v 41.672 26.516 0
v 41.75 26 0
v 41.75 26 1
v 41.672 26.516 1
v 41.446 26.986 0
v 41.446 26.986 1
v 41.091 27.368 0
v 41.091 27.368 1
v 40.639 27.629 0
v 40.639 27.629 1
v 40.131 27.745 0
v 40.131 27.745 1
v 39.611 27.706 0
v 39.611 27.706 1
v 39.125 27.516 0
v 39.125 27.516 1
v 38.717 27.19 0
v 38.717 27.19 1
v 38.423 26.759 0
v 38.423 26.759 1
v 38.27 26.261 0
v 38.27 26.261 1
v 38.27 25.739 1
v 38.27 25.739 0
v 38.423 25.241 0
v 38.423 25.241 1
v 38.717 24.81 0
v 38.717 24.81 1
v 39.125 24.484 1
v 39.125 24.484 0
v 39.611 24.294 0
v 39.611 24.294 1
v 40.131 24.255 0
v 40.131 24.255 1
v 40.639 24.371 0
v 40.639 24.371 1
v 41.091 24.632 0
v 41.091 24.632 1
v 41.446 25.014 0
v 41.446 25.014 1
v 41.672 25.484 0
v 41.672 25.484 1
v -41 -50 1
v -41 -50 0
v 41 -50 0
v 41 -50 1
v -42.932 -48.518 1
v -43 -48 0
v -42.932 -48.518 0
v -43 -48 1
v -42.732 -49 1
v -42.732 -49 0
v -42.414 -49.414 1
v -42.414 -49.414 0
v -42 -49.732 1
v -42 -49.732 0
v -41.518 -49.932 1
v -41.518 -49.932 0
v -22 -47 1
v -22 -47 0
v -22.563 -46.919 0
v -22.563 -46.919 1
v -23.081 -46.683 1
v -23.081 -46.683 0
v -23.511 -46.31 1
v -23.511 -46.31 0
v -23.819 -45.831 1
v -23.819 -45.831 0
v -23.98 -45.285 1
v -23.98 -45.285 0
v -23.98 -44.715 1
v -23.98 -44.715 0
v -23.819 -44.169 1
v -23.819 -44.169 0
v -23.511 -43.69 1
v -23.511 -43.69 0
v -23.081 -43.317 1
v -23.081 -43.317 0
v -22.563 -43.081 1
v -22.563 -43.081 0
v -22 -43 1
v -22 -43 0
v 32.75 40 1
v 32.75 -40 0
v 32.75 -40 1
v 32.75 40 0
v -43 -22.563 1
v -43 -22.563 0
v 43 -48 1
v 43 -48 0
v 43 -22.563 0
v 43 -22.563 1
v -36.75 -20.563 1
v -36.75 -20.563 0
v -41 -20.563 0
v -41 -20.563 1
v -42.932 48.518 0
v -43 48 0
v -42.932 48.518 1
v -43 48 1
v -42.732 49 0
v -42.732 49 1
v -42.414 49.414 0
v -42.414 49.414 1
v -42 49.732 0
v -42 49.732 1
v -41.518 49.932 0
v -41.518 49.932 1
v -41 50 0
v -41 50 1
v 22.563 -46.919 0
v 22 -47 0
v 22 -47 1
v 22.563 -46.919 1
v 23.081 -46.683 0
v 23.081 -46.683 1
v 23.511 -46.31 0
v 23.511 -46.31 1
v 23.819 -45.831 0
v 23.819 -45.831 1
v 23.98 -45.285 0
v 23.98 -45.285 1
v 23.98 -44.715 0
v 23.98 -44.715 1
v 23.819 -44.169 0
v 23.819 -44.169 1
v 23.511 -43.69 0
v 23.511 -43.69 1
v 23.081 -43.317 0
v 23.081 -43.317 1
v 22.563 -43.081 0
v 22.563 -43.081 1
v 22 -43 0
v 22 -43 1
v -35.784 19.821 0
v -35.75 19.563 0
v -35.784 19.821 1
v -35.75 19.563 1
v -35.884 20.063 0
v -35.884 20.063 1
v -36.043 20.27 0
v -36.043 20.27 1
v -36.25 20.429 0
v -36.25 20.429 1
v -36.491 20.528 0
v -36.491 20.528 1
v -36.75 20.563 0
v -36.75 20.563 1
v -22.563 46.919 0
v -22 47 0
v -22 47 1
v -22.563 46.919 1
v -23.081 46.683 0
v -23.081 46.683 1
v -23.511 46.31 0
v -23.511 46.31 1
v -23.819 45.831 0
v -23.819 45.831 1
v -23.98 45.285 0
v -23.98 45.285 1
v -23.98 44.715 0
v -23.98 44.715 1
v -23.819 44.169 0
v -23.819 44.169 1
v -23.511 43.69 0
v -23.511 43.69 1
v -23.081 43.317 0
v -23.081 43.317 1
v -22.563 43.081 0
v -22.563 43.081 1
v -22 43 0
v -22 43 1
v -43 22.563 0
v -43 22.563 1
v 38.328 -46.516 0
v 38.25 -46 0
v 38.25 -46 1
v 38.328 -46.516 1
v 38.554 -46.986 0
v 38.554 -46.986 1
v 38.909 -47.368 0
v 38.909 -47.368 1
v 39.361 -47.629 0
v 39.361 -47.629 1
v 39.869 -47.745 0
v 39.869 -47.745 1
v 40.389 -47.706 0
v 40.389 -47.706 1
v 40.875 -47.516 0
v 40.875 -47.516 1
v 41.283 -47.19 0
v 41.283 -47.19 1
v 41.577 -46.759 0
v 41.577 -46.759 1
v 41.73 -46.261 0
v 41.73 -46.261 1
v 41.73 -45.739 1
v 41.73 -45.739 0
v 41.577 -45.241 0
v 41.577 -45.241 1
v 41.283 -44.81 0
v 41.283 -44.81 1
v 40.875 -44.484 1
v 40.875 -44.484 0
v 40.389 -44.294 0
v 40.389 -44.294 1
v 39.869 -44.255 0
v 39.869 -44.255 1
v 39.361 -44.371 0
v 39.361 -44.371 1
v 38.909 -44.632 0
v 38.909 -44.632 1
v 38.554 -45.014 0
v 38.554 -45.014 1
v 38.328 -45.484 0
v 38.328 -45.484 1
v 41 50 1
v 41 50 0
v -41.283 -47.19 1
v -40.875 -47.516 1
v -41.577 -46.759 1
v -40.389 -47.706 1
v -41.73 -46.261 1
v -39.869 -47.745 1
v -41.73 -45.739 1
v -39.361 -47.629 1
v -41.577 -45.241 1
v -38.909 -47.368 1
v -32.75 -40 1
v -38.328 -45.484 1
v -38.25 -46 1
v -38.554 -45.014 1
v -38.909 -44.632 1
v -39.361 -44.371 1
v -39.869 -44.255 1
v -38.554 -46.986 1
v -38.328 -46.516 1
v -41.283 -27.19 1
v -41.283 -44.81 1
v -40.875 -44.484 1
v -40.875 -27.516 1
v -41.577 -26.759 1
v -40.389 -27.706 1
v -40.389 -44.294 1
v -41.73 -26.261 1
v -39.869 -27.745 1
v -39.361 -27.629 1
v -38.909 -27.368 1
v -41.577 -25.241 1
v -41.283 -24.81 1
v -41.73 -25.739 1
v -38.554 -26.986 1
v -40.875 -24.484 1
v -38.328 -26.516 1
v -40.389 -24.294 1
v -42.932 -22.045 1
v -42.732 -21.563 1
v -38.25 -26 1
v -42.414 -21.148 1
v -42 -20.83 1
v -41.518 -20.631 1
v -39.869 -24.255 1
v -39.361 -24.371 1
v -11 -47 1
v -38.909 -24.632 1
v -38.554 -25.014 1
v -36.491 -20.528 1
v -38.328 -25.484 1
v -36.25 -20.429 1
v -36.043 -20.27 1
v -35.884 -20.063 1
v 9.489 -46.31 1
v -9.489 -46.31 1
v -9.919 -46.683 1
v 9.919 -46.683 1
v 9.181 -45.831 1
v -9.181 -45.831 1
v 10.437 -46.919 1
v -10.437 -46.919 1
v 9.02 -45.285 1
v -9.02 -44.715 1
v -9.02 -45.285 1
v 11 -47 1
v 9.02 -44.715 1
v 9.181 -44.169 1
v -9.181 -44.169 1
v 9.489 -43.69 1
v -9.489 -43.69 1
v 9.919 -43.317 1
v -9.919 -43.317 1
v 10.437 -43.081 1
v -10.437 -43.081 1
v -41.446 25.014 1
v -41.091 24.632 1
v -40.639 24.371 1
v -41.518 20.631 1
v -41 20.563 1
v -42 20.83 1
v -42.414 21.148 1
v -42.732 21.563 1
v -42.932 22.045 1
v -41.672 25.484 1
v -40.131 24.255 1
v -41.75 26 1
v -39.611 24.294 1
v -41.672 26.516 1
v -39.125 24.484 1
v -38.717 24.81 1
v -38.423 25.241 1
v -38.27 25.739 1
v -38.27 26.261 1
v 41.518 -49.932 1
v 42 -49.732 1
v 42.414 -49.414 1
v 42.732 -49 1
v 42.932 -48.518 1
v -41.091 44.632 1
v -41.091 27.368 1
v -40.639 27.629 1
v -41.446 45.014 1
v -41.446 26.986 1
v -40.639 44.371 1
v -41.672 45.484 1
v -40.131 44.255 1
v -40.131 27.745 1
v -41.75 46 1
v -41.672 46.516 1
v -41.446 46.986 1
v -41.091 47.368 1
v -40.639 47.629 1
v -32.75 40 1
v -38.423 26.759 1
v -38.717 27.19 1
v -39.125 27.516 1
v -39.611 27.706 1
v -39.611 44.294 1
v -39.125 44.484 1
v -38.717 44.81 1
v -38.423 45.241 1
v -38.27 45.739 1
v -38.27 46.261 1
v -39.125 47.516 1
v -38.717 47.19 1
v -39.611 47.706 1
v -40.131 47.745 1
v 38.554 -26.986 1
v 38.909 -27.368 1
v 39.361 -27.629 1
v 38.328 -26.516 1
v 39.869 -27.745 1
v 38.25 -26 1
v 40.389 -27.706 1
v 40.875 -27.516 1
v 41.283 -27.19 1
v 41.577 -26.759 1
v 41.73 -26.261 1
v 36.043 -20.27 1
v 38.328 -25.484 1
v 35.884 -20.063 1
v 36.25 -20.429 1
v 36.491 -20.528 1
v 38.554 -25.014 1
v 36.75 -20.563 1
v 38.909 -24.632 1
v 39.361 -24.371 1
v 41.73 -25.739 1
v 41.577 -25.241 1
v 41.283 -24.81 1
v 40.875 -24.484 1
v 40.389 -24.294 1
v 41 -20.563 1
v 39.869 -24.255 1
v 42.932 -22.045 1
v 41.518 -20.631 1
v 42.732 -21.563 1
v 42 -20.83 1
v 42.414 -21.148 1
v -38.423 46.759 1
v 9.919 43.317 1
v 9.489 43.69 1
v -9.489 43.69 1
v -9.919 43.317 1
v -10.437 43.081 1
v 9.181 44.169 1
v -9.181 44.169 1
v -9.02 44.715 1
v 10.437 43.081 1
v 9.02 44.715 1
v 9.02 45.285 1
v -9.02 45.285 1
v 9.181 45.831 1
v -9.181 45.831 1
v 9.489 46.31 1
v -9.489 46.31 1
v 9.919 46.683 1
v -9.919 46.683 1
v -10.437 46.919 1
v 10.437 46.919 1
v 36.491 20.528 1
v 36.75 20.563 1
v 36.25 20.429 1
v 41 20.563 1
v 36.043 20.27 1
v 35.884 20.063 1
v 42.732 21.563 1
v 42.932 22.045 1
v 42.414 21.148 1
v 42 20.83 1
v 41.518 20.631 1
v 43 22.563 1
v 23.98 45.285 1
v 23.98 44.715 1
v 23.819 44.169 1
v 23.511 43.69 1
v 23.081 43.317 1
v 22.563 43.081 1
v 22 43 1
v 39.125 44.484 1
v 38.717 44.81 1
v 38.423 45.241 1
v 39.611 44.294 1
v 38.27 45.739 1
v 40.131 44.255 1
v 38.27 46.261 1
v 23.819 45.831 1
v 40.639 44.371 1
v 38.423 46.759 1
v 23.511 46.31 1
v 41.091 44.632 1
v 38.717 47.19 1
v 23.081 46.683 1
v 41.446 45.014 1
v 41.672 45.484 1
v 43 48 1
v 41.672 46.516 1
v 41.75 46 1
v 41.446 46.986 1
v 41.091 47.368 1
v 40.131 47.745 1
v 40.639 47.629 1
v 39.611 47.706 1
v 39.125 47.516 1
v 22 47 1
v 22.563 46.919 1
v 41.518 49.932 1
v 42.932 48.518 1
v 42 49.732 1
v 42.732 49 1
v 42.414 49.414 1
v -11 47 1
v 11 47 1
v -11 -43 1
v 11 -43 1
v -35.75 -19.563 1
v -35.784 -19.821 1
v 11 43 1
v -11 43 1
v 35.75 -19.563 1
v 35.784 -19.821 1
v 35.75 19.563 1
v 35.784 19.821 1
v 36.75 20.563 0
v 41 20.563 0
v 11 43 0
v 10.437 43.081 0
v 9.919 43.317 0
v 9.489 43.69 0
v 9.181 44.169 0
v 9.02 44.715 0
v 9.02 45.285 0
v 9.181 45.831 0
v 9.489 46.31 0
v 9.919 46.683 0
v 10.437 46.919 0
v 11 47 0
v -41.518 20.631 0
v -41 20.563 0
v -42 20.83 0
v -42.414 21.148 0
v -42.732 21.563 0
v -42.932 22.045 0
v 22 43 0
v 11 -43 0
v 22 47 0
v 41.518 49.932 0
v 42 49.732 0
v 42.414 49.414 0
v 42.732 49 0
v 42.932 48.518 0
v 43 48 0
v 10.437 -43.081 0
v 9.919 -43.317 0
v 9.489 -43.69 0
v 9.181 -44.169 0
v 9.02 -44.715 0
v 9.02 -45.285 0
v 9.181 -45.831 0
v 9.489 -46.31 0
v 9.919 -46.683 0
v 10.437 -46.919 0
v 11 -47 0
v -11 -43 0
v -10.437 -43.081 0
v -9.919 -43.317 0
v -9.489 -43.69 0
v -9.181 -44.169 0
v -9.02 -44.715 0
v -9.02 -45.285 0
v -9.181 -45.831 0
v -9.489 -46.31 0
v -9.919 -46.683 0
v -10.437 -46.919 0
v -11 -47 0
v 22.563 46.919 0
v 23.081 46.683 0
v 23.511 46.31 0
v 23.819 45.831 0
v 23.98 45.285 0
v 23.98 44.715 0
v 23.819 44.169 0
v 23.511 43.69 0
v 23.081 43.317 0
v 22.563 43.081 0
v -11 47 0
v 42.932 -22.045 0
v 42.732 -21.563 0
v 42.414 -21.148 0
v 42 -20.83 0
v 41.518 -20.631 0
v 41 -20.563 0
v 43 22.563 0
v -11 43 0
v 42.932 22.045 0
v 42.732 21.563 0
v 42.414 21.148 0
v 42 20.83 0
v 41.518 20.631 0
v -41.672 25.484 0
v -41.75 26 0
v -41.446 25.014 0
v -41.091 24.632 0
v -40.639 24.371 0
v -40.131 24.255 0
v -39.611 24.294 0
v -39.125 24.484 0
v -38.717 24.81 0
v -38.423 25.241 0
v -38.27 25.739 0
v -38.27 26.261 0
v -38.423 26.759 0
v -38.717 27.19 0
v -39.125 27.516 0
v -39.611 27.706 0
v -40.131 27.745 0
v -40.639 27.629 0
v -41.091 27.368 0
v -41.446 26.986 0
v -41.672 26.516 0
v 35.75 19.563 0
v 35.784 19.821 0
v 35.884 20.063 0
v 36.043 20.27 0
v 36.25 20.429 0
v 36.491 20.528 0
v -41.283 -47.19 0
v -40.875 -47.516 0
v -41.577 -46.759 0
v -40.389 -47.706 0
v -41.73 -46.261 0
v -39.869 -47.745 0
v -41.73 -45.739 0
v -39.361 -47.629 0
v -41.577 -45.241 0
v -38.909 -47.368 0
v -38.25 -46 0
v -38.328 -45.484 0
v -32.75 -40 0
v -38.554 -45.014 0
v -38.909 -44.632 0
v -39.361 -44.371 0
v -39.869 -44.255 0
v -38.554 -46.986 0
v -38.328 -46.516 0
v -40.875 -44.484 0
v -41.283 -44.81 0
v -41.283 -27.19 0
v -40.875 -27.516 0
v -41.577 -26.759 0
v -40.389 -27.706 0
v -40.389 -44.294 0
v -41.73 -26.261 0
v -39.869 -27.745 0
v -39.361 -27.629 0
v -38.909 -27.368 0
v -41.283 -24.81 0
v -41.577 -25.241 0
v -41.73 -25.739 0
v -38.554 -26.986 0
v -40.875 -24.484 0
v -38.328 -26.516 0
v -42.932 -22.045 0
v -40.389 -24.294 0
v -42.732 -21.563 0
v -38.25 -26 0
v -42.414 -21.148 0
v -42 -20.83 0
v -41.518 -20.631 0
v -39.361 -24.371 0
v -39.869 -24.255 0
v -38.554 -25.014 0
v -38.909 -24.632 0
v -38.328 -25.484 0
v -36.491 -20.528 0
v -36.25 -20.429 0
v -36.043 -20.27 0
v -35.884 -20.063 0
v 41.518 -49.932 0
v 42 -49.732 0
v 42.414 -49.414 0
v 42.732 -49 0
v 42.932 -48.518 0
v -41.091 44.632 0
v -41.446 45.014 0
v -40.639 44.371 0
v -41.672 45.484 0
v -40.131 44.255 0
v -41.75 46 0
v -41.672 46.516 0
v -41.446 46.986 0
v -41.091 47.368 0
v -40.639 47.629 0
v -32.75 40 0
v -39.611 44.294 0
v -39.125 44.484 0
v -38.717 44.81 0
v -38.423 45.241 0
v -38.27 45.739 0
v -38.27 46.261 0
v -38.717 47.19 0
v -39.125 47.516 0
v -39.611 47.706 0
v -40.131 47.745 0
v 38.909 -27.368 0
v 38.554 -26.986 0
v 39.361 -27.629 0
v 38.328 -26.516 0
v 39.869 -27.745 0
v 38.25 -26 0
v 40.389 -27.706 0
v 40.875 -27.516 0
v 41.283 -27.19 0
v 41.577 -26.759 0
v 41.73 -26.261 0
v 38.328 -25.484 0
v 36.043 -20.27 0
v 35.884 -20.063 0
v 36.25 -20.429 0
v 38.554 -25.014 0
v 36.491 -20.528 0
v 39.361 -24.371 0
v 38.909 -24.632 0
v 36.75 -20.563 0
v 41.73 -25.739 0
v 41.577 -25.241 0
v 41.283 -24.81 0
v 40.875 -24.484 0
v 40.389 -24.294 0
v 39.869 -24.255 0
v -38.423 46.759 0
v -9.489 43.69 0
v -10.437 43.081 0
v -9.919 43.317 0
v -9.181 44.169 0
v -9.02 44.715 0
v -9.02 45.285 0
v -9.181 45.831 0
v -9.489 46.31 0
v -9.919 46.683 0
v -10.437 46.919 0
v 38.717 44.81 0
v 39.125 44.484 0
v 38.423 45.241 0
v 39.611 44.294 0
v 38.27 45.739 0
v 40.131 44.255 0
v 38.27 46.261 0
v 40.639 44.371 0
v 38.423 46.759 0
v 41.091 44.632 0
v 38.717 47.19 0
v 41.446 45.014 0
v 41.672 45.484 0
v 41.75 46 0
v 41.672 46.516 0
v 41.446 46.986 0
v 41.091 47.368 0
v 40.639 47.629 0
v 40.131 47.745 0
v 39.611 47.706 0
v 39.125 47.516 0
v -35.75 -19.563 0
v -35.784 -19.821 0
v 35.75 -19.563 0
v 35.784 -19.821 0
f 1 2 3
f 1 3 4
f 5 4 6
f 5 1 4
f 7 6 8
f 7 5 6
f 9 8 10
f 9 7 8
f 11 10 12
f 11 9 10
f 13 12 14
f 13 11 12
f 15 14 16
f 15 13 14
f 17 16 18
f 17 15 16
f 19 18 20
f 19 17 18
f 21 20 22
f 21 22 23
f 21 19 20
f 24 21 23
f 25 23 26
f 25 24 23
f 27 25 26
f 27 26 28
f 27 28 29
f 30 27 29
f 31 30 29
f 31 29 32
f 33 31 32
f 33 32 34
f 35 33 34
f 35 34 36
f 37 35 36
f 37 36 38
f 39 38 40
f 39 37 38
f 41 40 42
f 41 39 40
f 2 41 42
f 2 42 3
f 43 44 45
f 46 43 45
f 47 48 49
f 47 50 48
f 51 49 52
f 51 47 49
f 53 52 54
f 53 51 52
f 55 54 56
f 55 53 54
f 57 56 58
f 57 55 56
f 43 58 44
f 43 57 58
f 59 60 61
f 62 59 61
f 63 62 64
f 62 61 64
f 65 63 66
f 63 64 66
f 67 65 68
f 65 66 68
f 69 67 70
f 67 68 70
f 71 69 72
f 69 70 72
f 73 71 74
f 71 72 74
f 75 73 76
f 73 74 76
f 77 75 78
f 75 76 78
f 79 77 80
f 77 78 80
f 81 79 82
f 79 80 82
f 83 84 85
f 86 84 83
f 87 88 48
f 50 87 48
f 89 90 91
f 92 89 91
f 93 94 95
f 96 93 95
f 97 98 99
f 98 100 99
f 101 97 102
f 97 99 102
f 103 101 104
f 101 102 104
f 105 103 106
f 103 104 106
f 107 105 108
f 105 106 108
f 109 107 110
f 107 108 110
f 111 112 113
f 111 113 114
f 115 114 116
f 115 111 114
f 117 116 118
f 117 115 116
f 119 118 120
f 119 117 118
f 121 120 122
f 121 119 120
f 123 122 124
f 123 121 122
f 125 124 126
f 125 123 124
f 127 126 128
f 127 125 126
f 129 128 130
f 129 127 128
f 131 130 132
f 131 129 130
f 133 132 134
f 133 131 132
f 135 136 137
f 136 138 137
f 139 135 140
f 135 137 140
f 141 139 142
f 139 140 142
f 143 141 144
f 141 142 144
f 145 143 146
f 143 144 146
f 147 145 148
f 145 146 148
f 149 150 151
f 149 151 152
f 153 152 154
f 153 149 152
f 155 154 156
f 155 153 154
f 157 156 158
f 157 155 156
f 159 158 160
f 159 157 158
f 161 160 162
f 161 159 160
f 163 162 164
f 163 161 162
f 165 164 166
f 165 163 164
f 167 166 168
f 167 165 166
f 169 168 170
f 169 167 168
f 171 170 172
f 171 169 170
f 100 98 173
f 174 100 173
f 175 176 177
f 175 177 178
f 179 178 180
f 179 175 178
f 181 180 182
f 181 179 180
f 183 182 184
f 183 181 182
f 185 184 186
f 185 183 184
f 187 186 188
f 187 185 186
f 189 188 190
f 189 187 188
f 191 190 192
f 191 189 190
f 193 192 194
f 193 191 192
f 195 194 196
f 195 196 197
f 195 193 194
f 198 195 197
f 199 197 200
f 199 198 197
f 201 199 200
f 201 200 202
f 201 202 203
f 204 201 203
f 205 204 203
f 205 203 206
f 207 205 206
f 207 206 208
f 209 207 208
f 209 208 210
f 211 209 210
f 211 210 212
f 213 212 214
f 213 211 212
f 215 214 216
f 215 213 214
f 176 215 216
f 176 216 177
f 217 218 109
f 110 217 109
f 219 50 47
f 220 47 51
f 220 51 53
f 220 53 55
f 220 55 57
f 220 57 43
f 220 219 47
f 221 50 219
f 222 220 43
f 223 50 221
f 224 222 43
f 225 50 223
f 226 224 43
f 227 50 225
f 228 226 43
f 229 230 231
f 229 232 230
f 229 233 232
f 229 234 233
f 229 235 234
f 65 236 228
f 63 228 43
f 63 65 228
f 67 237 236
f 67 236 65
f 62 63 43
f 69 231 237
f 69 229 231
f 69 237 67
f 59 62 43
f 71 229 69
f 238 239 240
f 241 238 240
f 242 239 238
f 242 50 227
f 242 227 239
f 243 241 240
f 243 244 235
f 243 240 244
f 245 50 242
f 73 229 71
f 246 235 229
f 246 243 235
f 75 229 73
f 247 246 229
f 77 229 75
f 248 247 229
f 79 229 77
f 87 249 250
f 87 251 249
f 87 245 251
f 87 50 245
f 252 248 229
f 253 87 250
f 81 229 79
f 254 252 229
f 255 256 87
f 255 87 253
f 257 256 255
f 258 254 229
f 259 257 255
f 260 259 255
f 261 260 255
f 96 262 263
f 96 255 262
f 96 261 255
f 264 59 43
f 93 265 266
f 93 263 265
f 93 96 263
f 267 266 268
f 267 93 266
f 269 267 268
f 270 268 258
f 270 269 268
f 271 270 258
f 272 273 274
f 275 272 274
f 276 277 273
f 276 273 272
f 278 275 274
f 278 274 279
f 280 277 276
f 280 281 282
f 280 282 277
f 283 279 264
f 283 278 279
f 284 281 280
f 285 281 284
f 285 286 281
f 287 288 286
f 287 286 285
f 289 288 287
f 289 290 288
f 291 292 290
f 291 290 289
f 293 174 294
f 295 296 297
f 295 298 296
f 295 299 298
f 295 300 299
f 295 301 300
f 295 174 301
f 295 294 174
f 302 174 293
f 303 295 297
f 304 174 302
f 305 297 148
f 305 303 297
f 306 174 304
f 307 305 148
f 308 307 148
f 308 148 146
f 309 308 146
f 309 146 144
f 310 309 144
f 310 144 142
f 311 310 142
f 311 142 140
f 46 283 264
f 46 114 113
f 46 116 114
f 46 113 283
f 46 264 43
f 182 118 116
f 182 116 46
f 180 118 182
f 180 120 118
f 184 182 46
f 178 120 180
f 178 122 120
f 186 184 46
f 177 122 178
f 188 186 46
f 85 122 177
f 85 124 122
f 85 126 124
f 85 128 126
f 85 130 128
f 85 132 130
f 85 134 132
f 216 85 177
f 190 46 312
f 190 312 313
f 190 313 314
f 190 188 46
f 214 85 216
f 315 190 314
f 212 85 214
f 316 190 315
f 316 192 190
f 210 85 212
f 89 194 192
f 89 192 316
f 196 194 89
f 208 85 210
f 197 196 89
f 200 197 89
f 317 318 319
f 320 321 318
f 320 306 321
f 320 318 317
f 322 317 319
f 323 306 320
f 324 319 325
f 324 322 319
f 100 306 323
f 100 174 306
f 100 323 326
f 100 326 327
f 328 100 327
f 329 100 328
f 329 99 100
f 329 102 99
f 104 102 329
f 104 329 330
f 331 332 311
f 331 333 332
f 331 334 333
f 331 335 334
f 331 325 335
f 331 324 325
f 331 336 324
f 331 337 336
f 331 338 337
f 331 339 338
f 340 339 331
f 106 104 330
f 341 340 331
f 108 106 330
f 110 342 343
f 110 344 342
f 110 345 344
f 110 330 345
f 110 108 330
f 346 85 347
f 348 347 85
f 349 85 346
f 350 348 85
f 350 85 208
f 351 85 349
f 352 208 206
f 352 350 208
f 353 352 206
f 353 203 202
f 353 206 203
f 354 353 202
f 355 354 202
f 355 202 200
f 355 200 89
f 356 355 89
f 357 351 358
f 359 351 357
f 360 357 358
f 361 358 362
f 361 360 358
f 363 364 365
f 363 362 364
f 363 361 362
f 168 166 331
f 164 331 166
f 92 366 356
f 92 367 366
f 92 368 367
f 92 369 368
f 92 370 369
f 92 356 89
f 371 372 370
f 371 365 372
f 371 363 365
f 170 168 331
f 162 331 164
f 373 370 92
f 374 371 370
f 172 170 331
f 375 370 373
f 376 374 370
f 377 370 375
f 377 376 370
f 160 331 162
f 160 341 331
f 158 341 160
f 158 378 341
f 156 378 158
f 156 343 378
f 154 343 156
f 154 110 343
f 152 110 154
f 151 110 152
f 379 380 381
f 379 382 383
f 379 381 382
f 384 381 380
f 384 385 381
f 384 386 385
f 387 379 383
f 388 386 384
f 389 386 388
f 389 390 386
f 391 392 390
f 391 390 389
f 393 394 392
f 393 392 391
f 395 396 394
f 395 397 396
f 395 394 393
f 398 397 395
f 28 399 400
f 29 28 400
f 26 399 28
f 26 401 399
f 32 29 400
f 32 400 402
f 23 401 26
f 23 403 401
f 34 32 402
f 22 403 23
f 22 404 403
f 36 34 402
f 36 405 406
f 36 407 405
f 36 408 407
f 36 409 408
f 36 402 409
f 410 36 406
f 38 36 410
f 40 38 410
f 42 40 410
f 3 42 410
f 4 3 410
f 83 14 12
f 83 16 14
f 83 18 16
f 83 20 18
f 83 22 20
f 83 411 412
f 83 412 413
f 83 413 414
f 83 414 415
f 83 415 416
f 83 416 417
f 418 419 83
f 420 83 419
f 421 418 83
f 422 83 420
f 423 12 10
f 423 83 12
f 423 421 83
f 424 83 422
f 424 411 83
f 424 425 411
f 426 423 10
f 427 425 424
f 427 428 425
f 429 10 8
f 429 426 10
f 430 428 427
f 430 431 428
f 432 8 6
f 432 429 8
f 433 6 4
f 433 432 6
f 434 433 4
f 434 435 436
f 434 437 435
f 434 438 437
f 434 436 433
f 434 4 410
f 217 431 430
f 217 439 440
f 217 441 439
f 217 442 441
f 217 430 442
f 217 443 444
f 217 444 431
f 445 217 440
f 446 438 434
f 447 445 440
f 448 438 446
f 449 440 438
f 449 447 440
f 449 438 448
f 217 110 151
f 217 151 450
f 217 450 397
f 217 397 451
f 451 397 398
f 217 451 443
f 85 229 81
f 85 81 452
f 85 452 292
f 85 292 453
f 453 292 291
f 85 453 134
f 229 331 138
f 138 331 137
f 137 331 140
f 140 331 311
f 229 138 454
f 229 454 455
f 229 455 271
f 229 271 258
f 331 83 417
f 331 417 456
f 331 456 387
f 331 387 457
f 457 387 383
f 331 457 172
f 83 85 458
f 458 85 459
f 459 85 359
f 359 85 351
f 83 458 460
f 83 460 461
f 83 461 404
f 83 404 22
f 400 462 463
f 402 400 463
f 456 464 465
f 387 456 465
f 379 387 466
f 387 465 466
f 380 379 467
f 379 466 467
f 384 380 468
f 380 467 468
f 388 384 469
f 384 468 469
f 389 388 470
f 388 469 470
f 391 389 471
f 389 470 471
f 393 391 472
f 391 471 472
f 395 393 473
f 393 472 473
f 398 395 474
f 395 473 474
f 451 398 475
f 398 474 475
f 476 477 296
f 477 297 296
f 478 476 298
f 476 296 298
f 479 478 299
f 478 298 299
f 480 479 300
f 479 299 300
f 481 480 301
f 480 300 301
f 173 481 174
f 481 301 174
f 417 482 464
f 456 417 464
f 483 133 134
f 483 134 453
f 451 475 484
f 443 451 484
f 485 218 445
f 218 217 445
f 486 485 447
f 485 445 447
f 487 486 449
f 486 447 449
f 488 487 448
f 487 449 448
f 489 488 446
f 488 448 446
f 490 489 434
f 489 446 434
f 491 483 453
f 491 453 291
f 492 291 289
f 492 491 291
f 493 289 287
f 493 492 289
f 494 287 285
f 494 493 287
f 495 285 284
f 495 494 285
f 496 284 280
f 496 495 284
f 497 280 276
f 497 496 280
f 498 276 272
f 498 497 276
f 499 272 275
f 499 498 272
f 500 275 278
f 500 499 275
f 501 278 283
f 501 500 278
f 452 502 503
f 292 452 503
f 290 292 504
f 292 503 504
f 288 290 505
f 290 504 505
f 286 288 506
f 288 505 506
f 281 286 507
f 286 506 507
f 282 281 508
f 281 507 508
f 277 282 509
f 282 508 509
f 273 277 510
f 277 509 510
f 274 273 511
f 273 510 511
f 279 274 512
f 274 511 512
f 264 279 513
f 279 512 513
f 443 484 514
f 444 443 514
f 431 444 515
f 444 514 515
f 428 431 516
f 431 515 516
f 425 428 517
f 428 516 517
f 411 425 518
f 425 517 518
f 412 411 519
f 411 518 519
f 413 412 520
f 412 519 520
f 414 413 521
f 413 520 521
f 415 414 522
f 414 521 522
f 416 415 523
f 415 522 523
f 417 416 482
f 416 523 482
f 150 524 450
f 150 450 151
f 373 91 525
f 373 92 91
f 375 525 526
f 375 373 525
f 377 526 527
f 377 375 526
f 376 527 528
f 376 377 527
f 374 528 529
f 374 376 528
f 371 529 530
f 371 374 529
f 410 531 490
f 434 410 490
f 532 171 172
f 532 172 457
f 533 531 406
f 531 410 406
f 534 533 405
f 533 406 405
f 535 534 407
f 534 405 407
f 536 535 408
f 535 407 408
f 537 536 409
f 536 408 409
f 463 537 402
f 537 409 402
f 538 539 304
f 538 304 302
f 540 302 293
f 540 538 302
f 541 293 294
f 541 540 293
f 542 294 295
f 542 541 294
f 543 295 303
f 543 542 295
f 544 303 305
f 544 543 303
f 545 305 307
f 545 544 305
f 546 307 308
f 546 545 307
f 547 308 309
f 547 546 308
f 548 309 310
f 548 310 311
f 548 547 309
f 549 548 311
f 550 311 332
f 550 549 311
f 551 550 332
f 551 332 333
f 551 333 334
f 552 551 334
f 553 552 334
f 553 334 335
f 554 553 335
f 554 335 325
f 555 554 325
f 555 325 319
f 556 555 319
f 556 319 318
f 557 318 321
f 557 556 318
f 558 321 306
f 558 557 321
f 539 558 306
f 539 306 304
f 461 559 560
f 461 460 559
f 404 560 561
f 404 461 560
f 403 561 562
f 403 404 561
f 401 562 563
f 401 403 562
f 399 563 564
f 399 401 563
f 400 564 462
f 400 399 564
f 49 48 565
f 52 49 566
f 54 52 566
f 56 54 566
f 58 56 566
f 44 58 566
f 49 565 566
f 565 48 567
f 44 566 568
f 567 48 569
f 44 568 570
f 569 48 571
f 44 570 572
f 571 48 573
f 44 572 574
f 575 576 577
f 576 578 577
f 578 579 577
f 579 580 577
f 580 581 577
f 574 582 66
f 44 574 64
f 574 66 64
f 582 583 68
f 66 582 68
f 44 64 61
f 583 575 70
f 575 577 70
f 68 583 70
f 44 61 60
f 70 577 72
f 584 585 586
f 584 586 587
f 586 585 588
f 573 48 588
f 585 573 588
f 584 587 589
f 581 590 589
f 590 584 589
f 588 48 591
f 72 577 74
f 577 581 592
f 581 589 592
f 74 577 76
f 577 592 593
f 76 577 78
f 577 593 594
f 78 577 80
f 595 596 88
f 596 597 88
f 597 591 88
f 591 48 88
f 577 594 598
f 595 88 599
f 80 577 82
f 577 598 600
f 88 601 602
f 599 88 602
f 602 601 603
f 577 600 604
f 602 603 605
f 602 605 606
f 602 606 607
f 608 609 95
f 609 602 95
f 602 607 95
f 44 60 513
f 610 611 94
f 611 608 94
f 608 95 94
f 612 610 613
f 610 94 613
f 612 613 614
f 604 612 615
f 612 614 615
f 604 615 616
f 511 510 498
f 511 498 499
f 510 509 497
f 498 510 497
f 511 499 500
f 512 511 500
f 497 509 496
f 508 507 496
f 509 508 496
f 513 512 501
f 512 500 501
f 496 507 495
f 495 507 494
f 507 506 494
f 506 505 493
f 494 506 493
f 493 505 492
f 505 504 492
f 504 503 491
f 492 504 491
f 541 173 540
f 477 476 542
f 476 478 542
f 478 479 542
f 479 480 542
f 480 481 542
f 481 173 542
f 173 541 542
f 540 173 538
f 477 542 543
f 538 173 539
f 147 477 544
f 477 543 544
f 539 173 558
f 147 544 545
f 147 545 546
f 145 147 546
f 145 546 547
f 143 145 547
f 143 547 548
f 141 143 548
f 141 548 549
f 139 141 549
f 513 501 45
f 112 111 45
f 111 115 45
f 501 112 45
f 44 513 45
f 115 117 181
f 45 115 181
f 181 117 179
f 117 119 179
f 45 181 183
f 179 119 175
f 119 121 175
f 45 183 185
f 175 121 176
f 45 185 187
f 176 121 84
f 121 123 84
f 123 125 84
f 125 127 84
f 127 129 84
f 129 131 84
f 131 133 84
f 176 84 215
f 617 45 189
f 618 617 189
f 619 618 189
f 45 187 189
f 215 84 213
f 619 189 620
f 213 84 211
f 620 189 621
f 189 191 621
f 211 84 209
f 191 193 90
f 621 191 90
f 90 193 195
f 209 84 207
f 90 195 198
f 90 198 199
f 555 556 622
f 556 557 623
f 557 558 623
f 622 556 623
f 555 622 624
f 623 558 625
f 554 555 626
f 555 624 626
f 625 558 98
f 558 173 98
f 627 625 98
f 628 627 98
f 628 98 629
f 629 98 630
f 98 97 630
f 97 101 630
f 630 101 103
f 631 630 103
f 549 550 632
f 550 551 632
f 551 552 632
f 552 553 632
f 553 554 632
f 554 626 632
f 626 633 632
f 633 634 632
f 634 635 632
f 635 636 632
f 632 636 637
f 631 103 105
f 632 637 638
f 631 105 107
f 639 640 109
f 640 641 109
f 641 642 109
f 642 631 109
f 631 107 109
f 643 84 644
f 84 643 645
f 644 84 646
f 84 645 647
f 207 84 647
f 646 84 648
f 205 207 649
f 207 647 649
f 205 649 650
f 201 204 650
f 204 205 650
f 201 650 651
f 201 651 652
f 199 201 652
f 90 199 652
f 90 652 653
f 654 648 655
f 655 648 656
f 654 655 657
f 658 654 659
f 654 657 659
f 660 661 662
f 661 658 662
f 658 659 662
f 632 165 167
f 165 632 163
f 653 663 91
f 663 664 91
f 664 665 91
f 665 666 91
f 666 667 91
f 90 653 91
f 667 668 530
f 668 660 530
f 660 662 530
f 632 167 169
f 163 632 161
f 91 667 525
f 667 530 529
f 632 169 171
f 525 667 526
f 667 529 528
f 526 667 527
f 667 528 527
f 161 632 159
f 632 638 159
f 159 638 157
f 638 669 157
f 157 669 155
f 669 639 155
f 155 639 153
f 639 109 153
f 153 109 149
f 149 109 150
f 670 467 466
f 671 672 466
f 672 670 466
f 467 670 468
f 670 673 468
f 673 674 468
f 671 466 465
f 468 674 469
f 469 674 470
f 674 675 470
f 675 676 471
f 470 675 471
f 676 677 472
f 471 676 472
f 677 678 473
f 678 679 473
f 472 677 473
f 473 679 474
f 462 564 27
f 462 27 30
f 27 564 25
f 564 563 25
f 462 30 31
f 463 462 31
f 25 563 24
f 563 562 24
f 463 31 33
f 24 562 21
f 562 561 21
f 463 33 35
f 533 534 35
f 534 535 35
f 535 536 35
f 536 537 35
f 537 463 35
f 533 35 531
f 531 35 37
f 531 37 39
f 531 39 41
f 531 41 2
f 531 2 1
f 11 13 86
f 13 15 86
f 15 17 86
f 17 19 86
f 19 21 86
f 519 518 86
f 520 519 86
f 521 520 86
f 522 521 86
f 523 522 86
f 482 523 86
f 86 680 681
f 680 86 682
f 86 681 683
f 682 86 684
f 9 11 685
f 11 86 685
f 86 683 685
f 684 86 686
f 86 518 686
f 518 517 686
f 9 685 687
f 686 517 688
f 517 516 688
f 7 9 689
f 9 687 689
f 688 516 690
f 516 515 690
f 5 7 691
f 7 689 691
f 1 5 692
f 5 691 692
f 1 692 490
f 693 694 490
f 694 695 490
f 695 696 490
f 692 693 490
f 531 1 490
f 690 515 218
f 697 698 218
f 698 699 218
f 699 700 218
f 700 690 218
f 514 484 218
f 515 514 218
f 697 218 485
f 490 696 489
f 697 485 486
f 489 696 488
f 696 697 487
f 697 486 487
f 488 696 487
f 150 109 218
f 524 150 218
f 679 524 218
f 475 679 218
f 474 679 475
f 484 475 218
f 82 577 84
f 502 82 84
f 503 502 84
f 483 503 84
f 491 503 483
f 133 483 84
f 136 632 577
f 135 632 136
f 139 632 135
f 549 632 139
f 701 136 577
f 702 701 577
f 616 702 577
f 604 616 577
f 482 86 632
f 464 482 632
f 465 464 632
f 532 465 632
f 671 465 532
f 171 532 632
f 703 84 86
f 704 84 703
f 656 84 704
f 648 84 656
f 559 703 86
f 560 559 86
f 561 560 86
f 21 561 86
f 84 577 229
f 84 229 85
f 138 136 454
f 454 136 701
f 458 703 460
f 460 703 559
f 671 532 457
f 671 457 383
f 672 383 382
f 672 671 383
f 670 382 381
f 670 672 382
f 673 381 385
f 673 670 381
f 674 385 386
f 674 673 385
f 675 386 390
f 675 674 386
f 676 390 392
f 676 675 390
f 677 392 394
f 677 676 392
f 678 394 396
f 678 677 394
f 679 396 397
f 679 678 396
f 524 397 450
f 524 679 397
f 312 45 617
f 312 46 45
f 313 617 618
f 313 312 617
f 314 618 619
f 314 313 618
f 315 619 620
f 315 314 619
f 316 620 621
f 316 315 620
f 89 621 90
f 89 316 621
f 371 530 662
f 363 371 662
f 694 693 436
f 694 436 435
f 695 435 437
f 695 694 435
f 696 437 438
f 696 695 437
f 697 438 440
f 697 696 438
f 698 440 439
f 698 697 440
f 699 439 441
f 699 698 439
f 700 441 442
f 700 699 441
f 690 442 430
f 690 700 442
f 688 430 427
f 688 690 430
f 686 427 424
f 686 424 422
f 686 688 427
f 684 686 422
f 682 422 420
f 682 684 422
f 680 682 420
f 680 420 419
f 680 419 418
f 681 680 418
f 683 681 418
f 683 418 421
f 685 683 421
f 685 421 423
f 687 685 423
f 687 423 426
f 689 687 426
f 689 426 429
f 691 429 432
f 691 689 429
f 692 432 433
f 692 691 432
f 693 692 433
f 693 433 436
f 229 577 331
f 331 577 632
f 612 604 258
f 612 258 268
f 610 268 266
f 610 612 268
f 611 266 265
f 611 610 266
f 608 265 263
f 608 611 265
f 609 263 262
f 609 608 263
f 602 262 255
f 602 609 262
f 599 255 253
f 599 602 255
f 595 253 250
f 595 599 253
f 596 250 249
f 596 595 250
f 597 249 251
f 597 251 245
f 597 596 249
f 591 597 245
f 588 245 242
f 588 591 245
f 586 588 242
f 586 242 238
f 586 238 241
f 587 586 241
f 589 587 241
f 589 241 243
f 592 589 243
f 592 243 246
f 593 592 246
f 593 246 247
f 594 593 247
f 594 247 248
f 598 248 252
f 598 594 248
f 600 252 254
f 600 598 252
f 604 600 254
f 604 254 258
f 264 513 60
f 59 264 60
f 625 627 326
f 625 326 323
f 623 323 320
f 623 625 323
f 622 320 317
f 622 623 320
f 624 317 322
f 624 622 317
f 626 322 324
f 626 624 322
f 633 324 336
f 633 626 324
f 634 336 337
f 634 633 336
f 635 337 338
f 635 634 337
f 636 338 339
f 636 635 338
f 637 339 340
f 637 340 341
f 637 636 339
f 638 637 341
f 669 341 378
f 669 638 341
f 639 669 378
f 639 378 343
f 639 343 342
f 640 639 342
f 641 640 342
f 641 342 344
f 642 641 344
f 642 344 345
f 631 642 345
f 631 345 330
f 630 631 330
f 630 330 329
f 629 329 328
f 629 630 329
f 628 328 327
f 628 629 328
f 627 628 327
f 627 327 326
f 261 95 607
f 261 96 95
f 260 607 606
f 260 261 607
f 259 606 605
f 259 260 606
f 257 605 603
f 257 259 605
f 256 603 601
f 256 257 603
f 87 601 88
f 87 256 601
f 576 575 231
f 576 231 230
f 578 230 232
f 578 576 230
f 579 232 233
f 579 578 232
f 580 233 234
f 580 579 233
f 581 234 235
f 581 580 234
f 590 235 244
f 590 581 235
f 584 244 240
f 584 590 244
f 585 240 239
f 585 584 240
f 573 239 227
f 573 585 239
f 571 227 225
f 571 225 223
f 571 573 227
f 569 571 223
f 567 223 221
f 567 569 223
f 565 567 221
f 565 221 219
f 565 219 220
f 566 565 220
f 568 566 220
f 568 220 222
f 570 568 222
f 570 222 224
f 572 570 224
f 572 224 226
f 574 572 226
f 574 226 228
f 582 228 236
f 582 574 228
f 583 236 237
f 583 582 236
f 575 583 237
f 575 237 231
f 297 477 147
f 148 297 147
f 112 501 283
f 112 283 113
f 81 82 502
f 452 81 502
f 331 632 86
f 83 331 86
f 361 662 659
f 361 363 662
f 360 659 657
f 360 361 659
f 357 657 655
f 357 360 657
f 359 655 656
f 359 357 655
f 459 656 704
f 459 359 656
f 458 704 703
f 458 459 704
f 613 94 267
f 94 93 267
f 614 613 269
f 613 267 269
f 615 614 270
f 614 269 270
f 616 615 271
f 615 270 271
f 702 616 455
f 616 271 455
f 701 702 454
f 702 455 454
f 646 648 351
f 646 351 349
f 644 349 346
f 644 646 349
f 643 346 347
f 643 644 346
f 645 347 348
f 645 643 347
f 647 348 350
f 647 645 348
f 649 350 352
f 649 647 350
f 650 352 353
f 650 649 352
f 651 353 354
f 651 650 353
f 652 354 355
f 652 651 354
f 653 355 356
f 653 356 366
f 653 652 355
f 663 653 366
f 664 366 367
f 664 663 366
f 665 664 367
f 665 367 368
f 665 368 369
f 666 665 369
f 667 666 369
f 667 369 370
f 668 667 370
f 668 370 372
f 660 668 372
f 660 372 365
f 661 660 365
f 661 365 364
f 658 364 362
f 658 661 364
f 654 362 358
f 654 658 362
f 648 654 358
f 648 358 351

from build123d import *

# Parameters (mm, degrees)
SKETCH_1_R      = 1.75
SKETCH_1_W      = 65.5
SKETCH_1_H      = 80
EXTRUDE_1_DEPTH = 1
FILLET_1_R      = 1
FILLET_2_R      = 2


with BuildPart() as part:
    # 草圖1 → 填料-伸長1 (new body)
    with BuildSketch(Plane.XY):
        Polygon((-35.75, -20.56252042), (-43, -20.56252042), (-43, -50), (-25.75, -50), (25.75, -50), (43, -50), (43, -20.56252042), (35.75, -20.56252042), (35.75, 20.56252042), (43, 20.56252042), (43, 50), (25.75, 50), (-25.75, 50), (-43, 50), (-43, 20.56252042), (-35.75, 20.56252042), align=None)
        with Locations((-40, -26)):
            Circle(SKETCH_1_R, mode=Mode.SUBTRACT)
        with Locations(Location((40, -26, 0), (0, 0, 180))):
            Circle(SKETCH_1_R, mode=Mode.SUBTRACT)
        with Locations((40, 26)):
            Circle(SKETCH_1_R, mode=Mode.SUBTRACT)
        with Locations(Location((-40, 26, 0), (0, 0, 180))):
            Circle(SKETCH_1_R, mode=Mode.SUBTRACT)
        with Locations((-40, -46)):
            Circle(SKETCH_1_R, mode=Mode.SUBTRACT)
        with Locations(Location((-40, 46, 0), (0, 0, 180))):
            Circle(SKETCH_1_R, mode=Mode.SUBTRACT)
        with Locations((40, 46)):
            Circle(SKETCH_1_R, mode=Mode.SUBTRACT)
        with Locations(Location((40, -46, 0), (0, 0, 180))):
            Circle(SKETCH_1_R, mode=Mode.SUBTRACT)
        Rectangle(SKETCH_1_W, SKETCH_1_H, mode=Mode.SUBTRACT)
        with BuildLine():
            Line((-22, -43), (-11, -43))
            ThreePointArc((-11, -43), (-9, -45), (-11, -47))
            Line((-11, -47), (-22, -47))
            ThreePointArc((-22, -47), (-24, -45), (-22, -43))
        make_face(mode=Mode.SUBTRACT)
        with BuildLine():
            Line((22, -43), (11, -43))
            ThreePointArc((11, -43), (9, -45), (11, -47))
            Line((11, -47), (22, -47))
            ThreePointArc((22, -47), (24, -45), (22, -43))
        make_face(mode=Mode.SUBTRACT)
        with BuildLine():
            Line((22, 43), (11, 43))
            ThreePointArc((11, 43), (9, 45), (11, 47))
            Line((11, 47), (22, 47))
            ThreePointArc((22, 47), (24, 45), (22, 43))
        make_face(mode=Mode.SUBTRACT)
        with BuildLine():
            Line((-22, 43), (-11, 43))
            ThreePointArc((-11, 43), (-9, 45), (-11, 47))
            Line((-11, 47), (-22, 47))
            ThreePointArc((-22, 47), (-24, 45), (-22, 43))
        make_face(mode=Mode.SUBTRACT)
    extrude(amount=EXTRUDE_1_DEPTH)

    # 圓角1
    fillet_1_edges = [part.edges().sort_by_distance(p)[0] for p in [
        (35.75, 20.56252042, 0.5),
        (35.75, -20.56252042, 0.5),
        (-35.75, -20.56252042, 0.5),
        (-35.75, 20.56252042, 0.5),
    ]]
    fillet(fillet_1_edges, radius=FILLET_1_R)

    # 圓角2
    fillet_2_edges = [part.edges().sort_by_distance(p)[0] for p in [
        (43, 50, 0.5),
        (43, 20.56252042, 0.5),
        (43, -20.56252042, 0.5),
        (43, -50, 0.5),
        (-43, -50, 0.5),
        (-43, -20.56252042, 0.5),
        (-43, 20.56252042, 0.5),
        (-43, 50, 0.5),
    ]]
    fillet(fillet_2_edges, radius=FILLET_2_R)


solid = part.part
